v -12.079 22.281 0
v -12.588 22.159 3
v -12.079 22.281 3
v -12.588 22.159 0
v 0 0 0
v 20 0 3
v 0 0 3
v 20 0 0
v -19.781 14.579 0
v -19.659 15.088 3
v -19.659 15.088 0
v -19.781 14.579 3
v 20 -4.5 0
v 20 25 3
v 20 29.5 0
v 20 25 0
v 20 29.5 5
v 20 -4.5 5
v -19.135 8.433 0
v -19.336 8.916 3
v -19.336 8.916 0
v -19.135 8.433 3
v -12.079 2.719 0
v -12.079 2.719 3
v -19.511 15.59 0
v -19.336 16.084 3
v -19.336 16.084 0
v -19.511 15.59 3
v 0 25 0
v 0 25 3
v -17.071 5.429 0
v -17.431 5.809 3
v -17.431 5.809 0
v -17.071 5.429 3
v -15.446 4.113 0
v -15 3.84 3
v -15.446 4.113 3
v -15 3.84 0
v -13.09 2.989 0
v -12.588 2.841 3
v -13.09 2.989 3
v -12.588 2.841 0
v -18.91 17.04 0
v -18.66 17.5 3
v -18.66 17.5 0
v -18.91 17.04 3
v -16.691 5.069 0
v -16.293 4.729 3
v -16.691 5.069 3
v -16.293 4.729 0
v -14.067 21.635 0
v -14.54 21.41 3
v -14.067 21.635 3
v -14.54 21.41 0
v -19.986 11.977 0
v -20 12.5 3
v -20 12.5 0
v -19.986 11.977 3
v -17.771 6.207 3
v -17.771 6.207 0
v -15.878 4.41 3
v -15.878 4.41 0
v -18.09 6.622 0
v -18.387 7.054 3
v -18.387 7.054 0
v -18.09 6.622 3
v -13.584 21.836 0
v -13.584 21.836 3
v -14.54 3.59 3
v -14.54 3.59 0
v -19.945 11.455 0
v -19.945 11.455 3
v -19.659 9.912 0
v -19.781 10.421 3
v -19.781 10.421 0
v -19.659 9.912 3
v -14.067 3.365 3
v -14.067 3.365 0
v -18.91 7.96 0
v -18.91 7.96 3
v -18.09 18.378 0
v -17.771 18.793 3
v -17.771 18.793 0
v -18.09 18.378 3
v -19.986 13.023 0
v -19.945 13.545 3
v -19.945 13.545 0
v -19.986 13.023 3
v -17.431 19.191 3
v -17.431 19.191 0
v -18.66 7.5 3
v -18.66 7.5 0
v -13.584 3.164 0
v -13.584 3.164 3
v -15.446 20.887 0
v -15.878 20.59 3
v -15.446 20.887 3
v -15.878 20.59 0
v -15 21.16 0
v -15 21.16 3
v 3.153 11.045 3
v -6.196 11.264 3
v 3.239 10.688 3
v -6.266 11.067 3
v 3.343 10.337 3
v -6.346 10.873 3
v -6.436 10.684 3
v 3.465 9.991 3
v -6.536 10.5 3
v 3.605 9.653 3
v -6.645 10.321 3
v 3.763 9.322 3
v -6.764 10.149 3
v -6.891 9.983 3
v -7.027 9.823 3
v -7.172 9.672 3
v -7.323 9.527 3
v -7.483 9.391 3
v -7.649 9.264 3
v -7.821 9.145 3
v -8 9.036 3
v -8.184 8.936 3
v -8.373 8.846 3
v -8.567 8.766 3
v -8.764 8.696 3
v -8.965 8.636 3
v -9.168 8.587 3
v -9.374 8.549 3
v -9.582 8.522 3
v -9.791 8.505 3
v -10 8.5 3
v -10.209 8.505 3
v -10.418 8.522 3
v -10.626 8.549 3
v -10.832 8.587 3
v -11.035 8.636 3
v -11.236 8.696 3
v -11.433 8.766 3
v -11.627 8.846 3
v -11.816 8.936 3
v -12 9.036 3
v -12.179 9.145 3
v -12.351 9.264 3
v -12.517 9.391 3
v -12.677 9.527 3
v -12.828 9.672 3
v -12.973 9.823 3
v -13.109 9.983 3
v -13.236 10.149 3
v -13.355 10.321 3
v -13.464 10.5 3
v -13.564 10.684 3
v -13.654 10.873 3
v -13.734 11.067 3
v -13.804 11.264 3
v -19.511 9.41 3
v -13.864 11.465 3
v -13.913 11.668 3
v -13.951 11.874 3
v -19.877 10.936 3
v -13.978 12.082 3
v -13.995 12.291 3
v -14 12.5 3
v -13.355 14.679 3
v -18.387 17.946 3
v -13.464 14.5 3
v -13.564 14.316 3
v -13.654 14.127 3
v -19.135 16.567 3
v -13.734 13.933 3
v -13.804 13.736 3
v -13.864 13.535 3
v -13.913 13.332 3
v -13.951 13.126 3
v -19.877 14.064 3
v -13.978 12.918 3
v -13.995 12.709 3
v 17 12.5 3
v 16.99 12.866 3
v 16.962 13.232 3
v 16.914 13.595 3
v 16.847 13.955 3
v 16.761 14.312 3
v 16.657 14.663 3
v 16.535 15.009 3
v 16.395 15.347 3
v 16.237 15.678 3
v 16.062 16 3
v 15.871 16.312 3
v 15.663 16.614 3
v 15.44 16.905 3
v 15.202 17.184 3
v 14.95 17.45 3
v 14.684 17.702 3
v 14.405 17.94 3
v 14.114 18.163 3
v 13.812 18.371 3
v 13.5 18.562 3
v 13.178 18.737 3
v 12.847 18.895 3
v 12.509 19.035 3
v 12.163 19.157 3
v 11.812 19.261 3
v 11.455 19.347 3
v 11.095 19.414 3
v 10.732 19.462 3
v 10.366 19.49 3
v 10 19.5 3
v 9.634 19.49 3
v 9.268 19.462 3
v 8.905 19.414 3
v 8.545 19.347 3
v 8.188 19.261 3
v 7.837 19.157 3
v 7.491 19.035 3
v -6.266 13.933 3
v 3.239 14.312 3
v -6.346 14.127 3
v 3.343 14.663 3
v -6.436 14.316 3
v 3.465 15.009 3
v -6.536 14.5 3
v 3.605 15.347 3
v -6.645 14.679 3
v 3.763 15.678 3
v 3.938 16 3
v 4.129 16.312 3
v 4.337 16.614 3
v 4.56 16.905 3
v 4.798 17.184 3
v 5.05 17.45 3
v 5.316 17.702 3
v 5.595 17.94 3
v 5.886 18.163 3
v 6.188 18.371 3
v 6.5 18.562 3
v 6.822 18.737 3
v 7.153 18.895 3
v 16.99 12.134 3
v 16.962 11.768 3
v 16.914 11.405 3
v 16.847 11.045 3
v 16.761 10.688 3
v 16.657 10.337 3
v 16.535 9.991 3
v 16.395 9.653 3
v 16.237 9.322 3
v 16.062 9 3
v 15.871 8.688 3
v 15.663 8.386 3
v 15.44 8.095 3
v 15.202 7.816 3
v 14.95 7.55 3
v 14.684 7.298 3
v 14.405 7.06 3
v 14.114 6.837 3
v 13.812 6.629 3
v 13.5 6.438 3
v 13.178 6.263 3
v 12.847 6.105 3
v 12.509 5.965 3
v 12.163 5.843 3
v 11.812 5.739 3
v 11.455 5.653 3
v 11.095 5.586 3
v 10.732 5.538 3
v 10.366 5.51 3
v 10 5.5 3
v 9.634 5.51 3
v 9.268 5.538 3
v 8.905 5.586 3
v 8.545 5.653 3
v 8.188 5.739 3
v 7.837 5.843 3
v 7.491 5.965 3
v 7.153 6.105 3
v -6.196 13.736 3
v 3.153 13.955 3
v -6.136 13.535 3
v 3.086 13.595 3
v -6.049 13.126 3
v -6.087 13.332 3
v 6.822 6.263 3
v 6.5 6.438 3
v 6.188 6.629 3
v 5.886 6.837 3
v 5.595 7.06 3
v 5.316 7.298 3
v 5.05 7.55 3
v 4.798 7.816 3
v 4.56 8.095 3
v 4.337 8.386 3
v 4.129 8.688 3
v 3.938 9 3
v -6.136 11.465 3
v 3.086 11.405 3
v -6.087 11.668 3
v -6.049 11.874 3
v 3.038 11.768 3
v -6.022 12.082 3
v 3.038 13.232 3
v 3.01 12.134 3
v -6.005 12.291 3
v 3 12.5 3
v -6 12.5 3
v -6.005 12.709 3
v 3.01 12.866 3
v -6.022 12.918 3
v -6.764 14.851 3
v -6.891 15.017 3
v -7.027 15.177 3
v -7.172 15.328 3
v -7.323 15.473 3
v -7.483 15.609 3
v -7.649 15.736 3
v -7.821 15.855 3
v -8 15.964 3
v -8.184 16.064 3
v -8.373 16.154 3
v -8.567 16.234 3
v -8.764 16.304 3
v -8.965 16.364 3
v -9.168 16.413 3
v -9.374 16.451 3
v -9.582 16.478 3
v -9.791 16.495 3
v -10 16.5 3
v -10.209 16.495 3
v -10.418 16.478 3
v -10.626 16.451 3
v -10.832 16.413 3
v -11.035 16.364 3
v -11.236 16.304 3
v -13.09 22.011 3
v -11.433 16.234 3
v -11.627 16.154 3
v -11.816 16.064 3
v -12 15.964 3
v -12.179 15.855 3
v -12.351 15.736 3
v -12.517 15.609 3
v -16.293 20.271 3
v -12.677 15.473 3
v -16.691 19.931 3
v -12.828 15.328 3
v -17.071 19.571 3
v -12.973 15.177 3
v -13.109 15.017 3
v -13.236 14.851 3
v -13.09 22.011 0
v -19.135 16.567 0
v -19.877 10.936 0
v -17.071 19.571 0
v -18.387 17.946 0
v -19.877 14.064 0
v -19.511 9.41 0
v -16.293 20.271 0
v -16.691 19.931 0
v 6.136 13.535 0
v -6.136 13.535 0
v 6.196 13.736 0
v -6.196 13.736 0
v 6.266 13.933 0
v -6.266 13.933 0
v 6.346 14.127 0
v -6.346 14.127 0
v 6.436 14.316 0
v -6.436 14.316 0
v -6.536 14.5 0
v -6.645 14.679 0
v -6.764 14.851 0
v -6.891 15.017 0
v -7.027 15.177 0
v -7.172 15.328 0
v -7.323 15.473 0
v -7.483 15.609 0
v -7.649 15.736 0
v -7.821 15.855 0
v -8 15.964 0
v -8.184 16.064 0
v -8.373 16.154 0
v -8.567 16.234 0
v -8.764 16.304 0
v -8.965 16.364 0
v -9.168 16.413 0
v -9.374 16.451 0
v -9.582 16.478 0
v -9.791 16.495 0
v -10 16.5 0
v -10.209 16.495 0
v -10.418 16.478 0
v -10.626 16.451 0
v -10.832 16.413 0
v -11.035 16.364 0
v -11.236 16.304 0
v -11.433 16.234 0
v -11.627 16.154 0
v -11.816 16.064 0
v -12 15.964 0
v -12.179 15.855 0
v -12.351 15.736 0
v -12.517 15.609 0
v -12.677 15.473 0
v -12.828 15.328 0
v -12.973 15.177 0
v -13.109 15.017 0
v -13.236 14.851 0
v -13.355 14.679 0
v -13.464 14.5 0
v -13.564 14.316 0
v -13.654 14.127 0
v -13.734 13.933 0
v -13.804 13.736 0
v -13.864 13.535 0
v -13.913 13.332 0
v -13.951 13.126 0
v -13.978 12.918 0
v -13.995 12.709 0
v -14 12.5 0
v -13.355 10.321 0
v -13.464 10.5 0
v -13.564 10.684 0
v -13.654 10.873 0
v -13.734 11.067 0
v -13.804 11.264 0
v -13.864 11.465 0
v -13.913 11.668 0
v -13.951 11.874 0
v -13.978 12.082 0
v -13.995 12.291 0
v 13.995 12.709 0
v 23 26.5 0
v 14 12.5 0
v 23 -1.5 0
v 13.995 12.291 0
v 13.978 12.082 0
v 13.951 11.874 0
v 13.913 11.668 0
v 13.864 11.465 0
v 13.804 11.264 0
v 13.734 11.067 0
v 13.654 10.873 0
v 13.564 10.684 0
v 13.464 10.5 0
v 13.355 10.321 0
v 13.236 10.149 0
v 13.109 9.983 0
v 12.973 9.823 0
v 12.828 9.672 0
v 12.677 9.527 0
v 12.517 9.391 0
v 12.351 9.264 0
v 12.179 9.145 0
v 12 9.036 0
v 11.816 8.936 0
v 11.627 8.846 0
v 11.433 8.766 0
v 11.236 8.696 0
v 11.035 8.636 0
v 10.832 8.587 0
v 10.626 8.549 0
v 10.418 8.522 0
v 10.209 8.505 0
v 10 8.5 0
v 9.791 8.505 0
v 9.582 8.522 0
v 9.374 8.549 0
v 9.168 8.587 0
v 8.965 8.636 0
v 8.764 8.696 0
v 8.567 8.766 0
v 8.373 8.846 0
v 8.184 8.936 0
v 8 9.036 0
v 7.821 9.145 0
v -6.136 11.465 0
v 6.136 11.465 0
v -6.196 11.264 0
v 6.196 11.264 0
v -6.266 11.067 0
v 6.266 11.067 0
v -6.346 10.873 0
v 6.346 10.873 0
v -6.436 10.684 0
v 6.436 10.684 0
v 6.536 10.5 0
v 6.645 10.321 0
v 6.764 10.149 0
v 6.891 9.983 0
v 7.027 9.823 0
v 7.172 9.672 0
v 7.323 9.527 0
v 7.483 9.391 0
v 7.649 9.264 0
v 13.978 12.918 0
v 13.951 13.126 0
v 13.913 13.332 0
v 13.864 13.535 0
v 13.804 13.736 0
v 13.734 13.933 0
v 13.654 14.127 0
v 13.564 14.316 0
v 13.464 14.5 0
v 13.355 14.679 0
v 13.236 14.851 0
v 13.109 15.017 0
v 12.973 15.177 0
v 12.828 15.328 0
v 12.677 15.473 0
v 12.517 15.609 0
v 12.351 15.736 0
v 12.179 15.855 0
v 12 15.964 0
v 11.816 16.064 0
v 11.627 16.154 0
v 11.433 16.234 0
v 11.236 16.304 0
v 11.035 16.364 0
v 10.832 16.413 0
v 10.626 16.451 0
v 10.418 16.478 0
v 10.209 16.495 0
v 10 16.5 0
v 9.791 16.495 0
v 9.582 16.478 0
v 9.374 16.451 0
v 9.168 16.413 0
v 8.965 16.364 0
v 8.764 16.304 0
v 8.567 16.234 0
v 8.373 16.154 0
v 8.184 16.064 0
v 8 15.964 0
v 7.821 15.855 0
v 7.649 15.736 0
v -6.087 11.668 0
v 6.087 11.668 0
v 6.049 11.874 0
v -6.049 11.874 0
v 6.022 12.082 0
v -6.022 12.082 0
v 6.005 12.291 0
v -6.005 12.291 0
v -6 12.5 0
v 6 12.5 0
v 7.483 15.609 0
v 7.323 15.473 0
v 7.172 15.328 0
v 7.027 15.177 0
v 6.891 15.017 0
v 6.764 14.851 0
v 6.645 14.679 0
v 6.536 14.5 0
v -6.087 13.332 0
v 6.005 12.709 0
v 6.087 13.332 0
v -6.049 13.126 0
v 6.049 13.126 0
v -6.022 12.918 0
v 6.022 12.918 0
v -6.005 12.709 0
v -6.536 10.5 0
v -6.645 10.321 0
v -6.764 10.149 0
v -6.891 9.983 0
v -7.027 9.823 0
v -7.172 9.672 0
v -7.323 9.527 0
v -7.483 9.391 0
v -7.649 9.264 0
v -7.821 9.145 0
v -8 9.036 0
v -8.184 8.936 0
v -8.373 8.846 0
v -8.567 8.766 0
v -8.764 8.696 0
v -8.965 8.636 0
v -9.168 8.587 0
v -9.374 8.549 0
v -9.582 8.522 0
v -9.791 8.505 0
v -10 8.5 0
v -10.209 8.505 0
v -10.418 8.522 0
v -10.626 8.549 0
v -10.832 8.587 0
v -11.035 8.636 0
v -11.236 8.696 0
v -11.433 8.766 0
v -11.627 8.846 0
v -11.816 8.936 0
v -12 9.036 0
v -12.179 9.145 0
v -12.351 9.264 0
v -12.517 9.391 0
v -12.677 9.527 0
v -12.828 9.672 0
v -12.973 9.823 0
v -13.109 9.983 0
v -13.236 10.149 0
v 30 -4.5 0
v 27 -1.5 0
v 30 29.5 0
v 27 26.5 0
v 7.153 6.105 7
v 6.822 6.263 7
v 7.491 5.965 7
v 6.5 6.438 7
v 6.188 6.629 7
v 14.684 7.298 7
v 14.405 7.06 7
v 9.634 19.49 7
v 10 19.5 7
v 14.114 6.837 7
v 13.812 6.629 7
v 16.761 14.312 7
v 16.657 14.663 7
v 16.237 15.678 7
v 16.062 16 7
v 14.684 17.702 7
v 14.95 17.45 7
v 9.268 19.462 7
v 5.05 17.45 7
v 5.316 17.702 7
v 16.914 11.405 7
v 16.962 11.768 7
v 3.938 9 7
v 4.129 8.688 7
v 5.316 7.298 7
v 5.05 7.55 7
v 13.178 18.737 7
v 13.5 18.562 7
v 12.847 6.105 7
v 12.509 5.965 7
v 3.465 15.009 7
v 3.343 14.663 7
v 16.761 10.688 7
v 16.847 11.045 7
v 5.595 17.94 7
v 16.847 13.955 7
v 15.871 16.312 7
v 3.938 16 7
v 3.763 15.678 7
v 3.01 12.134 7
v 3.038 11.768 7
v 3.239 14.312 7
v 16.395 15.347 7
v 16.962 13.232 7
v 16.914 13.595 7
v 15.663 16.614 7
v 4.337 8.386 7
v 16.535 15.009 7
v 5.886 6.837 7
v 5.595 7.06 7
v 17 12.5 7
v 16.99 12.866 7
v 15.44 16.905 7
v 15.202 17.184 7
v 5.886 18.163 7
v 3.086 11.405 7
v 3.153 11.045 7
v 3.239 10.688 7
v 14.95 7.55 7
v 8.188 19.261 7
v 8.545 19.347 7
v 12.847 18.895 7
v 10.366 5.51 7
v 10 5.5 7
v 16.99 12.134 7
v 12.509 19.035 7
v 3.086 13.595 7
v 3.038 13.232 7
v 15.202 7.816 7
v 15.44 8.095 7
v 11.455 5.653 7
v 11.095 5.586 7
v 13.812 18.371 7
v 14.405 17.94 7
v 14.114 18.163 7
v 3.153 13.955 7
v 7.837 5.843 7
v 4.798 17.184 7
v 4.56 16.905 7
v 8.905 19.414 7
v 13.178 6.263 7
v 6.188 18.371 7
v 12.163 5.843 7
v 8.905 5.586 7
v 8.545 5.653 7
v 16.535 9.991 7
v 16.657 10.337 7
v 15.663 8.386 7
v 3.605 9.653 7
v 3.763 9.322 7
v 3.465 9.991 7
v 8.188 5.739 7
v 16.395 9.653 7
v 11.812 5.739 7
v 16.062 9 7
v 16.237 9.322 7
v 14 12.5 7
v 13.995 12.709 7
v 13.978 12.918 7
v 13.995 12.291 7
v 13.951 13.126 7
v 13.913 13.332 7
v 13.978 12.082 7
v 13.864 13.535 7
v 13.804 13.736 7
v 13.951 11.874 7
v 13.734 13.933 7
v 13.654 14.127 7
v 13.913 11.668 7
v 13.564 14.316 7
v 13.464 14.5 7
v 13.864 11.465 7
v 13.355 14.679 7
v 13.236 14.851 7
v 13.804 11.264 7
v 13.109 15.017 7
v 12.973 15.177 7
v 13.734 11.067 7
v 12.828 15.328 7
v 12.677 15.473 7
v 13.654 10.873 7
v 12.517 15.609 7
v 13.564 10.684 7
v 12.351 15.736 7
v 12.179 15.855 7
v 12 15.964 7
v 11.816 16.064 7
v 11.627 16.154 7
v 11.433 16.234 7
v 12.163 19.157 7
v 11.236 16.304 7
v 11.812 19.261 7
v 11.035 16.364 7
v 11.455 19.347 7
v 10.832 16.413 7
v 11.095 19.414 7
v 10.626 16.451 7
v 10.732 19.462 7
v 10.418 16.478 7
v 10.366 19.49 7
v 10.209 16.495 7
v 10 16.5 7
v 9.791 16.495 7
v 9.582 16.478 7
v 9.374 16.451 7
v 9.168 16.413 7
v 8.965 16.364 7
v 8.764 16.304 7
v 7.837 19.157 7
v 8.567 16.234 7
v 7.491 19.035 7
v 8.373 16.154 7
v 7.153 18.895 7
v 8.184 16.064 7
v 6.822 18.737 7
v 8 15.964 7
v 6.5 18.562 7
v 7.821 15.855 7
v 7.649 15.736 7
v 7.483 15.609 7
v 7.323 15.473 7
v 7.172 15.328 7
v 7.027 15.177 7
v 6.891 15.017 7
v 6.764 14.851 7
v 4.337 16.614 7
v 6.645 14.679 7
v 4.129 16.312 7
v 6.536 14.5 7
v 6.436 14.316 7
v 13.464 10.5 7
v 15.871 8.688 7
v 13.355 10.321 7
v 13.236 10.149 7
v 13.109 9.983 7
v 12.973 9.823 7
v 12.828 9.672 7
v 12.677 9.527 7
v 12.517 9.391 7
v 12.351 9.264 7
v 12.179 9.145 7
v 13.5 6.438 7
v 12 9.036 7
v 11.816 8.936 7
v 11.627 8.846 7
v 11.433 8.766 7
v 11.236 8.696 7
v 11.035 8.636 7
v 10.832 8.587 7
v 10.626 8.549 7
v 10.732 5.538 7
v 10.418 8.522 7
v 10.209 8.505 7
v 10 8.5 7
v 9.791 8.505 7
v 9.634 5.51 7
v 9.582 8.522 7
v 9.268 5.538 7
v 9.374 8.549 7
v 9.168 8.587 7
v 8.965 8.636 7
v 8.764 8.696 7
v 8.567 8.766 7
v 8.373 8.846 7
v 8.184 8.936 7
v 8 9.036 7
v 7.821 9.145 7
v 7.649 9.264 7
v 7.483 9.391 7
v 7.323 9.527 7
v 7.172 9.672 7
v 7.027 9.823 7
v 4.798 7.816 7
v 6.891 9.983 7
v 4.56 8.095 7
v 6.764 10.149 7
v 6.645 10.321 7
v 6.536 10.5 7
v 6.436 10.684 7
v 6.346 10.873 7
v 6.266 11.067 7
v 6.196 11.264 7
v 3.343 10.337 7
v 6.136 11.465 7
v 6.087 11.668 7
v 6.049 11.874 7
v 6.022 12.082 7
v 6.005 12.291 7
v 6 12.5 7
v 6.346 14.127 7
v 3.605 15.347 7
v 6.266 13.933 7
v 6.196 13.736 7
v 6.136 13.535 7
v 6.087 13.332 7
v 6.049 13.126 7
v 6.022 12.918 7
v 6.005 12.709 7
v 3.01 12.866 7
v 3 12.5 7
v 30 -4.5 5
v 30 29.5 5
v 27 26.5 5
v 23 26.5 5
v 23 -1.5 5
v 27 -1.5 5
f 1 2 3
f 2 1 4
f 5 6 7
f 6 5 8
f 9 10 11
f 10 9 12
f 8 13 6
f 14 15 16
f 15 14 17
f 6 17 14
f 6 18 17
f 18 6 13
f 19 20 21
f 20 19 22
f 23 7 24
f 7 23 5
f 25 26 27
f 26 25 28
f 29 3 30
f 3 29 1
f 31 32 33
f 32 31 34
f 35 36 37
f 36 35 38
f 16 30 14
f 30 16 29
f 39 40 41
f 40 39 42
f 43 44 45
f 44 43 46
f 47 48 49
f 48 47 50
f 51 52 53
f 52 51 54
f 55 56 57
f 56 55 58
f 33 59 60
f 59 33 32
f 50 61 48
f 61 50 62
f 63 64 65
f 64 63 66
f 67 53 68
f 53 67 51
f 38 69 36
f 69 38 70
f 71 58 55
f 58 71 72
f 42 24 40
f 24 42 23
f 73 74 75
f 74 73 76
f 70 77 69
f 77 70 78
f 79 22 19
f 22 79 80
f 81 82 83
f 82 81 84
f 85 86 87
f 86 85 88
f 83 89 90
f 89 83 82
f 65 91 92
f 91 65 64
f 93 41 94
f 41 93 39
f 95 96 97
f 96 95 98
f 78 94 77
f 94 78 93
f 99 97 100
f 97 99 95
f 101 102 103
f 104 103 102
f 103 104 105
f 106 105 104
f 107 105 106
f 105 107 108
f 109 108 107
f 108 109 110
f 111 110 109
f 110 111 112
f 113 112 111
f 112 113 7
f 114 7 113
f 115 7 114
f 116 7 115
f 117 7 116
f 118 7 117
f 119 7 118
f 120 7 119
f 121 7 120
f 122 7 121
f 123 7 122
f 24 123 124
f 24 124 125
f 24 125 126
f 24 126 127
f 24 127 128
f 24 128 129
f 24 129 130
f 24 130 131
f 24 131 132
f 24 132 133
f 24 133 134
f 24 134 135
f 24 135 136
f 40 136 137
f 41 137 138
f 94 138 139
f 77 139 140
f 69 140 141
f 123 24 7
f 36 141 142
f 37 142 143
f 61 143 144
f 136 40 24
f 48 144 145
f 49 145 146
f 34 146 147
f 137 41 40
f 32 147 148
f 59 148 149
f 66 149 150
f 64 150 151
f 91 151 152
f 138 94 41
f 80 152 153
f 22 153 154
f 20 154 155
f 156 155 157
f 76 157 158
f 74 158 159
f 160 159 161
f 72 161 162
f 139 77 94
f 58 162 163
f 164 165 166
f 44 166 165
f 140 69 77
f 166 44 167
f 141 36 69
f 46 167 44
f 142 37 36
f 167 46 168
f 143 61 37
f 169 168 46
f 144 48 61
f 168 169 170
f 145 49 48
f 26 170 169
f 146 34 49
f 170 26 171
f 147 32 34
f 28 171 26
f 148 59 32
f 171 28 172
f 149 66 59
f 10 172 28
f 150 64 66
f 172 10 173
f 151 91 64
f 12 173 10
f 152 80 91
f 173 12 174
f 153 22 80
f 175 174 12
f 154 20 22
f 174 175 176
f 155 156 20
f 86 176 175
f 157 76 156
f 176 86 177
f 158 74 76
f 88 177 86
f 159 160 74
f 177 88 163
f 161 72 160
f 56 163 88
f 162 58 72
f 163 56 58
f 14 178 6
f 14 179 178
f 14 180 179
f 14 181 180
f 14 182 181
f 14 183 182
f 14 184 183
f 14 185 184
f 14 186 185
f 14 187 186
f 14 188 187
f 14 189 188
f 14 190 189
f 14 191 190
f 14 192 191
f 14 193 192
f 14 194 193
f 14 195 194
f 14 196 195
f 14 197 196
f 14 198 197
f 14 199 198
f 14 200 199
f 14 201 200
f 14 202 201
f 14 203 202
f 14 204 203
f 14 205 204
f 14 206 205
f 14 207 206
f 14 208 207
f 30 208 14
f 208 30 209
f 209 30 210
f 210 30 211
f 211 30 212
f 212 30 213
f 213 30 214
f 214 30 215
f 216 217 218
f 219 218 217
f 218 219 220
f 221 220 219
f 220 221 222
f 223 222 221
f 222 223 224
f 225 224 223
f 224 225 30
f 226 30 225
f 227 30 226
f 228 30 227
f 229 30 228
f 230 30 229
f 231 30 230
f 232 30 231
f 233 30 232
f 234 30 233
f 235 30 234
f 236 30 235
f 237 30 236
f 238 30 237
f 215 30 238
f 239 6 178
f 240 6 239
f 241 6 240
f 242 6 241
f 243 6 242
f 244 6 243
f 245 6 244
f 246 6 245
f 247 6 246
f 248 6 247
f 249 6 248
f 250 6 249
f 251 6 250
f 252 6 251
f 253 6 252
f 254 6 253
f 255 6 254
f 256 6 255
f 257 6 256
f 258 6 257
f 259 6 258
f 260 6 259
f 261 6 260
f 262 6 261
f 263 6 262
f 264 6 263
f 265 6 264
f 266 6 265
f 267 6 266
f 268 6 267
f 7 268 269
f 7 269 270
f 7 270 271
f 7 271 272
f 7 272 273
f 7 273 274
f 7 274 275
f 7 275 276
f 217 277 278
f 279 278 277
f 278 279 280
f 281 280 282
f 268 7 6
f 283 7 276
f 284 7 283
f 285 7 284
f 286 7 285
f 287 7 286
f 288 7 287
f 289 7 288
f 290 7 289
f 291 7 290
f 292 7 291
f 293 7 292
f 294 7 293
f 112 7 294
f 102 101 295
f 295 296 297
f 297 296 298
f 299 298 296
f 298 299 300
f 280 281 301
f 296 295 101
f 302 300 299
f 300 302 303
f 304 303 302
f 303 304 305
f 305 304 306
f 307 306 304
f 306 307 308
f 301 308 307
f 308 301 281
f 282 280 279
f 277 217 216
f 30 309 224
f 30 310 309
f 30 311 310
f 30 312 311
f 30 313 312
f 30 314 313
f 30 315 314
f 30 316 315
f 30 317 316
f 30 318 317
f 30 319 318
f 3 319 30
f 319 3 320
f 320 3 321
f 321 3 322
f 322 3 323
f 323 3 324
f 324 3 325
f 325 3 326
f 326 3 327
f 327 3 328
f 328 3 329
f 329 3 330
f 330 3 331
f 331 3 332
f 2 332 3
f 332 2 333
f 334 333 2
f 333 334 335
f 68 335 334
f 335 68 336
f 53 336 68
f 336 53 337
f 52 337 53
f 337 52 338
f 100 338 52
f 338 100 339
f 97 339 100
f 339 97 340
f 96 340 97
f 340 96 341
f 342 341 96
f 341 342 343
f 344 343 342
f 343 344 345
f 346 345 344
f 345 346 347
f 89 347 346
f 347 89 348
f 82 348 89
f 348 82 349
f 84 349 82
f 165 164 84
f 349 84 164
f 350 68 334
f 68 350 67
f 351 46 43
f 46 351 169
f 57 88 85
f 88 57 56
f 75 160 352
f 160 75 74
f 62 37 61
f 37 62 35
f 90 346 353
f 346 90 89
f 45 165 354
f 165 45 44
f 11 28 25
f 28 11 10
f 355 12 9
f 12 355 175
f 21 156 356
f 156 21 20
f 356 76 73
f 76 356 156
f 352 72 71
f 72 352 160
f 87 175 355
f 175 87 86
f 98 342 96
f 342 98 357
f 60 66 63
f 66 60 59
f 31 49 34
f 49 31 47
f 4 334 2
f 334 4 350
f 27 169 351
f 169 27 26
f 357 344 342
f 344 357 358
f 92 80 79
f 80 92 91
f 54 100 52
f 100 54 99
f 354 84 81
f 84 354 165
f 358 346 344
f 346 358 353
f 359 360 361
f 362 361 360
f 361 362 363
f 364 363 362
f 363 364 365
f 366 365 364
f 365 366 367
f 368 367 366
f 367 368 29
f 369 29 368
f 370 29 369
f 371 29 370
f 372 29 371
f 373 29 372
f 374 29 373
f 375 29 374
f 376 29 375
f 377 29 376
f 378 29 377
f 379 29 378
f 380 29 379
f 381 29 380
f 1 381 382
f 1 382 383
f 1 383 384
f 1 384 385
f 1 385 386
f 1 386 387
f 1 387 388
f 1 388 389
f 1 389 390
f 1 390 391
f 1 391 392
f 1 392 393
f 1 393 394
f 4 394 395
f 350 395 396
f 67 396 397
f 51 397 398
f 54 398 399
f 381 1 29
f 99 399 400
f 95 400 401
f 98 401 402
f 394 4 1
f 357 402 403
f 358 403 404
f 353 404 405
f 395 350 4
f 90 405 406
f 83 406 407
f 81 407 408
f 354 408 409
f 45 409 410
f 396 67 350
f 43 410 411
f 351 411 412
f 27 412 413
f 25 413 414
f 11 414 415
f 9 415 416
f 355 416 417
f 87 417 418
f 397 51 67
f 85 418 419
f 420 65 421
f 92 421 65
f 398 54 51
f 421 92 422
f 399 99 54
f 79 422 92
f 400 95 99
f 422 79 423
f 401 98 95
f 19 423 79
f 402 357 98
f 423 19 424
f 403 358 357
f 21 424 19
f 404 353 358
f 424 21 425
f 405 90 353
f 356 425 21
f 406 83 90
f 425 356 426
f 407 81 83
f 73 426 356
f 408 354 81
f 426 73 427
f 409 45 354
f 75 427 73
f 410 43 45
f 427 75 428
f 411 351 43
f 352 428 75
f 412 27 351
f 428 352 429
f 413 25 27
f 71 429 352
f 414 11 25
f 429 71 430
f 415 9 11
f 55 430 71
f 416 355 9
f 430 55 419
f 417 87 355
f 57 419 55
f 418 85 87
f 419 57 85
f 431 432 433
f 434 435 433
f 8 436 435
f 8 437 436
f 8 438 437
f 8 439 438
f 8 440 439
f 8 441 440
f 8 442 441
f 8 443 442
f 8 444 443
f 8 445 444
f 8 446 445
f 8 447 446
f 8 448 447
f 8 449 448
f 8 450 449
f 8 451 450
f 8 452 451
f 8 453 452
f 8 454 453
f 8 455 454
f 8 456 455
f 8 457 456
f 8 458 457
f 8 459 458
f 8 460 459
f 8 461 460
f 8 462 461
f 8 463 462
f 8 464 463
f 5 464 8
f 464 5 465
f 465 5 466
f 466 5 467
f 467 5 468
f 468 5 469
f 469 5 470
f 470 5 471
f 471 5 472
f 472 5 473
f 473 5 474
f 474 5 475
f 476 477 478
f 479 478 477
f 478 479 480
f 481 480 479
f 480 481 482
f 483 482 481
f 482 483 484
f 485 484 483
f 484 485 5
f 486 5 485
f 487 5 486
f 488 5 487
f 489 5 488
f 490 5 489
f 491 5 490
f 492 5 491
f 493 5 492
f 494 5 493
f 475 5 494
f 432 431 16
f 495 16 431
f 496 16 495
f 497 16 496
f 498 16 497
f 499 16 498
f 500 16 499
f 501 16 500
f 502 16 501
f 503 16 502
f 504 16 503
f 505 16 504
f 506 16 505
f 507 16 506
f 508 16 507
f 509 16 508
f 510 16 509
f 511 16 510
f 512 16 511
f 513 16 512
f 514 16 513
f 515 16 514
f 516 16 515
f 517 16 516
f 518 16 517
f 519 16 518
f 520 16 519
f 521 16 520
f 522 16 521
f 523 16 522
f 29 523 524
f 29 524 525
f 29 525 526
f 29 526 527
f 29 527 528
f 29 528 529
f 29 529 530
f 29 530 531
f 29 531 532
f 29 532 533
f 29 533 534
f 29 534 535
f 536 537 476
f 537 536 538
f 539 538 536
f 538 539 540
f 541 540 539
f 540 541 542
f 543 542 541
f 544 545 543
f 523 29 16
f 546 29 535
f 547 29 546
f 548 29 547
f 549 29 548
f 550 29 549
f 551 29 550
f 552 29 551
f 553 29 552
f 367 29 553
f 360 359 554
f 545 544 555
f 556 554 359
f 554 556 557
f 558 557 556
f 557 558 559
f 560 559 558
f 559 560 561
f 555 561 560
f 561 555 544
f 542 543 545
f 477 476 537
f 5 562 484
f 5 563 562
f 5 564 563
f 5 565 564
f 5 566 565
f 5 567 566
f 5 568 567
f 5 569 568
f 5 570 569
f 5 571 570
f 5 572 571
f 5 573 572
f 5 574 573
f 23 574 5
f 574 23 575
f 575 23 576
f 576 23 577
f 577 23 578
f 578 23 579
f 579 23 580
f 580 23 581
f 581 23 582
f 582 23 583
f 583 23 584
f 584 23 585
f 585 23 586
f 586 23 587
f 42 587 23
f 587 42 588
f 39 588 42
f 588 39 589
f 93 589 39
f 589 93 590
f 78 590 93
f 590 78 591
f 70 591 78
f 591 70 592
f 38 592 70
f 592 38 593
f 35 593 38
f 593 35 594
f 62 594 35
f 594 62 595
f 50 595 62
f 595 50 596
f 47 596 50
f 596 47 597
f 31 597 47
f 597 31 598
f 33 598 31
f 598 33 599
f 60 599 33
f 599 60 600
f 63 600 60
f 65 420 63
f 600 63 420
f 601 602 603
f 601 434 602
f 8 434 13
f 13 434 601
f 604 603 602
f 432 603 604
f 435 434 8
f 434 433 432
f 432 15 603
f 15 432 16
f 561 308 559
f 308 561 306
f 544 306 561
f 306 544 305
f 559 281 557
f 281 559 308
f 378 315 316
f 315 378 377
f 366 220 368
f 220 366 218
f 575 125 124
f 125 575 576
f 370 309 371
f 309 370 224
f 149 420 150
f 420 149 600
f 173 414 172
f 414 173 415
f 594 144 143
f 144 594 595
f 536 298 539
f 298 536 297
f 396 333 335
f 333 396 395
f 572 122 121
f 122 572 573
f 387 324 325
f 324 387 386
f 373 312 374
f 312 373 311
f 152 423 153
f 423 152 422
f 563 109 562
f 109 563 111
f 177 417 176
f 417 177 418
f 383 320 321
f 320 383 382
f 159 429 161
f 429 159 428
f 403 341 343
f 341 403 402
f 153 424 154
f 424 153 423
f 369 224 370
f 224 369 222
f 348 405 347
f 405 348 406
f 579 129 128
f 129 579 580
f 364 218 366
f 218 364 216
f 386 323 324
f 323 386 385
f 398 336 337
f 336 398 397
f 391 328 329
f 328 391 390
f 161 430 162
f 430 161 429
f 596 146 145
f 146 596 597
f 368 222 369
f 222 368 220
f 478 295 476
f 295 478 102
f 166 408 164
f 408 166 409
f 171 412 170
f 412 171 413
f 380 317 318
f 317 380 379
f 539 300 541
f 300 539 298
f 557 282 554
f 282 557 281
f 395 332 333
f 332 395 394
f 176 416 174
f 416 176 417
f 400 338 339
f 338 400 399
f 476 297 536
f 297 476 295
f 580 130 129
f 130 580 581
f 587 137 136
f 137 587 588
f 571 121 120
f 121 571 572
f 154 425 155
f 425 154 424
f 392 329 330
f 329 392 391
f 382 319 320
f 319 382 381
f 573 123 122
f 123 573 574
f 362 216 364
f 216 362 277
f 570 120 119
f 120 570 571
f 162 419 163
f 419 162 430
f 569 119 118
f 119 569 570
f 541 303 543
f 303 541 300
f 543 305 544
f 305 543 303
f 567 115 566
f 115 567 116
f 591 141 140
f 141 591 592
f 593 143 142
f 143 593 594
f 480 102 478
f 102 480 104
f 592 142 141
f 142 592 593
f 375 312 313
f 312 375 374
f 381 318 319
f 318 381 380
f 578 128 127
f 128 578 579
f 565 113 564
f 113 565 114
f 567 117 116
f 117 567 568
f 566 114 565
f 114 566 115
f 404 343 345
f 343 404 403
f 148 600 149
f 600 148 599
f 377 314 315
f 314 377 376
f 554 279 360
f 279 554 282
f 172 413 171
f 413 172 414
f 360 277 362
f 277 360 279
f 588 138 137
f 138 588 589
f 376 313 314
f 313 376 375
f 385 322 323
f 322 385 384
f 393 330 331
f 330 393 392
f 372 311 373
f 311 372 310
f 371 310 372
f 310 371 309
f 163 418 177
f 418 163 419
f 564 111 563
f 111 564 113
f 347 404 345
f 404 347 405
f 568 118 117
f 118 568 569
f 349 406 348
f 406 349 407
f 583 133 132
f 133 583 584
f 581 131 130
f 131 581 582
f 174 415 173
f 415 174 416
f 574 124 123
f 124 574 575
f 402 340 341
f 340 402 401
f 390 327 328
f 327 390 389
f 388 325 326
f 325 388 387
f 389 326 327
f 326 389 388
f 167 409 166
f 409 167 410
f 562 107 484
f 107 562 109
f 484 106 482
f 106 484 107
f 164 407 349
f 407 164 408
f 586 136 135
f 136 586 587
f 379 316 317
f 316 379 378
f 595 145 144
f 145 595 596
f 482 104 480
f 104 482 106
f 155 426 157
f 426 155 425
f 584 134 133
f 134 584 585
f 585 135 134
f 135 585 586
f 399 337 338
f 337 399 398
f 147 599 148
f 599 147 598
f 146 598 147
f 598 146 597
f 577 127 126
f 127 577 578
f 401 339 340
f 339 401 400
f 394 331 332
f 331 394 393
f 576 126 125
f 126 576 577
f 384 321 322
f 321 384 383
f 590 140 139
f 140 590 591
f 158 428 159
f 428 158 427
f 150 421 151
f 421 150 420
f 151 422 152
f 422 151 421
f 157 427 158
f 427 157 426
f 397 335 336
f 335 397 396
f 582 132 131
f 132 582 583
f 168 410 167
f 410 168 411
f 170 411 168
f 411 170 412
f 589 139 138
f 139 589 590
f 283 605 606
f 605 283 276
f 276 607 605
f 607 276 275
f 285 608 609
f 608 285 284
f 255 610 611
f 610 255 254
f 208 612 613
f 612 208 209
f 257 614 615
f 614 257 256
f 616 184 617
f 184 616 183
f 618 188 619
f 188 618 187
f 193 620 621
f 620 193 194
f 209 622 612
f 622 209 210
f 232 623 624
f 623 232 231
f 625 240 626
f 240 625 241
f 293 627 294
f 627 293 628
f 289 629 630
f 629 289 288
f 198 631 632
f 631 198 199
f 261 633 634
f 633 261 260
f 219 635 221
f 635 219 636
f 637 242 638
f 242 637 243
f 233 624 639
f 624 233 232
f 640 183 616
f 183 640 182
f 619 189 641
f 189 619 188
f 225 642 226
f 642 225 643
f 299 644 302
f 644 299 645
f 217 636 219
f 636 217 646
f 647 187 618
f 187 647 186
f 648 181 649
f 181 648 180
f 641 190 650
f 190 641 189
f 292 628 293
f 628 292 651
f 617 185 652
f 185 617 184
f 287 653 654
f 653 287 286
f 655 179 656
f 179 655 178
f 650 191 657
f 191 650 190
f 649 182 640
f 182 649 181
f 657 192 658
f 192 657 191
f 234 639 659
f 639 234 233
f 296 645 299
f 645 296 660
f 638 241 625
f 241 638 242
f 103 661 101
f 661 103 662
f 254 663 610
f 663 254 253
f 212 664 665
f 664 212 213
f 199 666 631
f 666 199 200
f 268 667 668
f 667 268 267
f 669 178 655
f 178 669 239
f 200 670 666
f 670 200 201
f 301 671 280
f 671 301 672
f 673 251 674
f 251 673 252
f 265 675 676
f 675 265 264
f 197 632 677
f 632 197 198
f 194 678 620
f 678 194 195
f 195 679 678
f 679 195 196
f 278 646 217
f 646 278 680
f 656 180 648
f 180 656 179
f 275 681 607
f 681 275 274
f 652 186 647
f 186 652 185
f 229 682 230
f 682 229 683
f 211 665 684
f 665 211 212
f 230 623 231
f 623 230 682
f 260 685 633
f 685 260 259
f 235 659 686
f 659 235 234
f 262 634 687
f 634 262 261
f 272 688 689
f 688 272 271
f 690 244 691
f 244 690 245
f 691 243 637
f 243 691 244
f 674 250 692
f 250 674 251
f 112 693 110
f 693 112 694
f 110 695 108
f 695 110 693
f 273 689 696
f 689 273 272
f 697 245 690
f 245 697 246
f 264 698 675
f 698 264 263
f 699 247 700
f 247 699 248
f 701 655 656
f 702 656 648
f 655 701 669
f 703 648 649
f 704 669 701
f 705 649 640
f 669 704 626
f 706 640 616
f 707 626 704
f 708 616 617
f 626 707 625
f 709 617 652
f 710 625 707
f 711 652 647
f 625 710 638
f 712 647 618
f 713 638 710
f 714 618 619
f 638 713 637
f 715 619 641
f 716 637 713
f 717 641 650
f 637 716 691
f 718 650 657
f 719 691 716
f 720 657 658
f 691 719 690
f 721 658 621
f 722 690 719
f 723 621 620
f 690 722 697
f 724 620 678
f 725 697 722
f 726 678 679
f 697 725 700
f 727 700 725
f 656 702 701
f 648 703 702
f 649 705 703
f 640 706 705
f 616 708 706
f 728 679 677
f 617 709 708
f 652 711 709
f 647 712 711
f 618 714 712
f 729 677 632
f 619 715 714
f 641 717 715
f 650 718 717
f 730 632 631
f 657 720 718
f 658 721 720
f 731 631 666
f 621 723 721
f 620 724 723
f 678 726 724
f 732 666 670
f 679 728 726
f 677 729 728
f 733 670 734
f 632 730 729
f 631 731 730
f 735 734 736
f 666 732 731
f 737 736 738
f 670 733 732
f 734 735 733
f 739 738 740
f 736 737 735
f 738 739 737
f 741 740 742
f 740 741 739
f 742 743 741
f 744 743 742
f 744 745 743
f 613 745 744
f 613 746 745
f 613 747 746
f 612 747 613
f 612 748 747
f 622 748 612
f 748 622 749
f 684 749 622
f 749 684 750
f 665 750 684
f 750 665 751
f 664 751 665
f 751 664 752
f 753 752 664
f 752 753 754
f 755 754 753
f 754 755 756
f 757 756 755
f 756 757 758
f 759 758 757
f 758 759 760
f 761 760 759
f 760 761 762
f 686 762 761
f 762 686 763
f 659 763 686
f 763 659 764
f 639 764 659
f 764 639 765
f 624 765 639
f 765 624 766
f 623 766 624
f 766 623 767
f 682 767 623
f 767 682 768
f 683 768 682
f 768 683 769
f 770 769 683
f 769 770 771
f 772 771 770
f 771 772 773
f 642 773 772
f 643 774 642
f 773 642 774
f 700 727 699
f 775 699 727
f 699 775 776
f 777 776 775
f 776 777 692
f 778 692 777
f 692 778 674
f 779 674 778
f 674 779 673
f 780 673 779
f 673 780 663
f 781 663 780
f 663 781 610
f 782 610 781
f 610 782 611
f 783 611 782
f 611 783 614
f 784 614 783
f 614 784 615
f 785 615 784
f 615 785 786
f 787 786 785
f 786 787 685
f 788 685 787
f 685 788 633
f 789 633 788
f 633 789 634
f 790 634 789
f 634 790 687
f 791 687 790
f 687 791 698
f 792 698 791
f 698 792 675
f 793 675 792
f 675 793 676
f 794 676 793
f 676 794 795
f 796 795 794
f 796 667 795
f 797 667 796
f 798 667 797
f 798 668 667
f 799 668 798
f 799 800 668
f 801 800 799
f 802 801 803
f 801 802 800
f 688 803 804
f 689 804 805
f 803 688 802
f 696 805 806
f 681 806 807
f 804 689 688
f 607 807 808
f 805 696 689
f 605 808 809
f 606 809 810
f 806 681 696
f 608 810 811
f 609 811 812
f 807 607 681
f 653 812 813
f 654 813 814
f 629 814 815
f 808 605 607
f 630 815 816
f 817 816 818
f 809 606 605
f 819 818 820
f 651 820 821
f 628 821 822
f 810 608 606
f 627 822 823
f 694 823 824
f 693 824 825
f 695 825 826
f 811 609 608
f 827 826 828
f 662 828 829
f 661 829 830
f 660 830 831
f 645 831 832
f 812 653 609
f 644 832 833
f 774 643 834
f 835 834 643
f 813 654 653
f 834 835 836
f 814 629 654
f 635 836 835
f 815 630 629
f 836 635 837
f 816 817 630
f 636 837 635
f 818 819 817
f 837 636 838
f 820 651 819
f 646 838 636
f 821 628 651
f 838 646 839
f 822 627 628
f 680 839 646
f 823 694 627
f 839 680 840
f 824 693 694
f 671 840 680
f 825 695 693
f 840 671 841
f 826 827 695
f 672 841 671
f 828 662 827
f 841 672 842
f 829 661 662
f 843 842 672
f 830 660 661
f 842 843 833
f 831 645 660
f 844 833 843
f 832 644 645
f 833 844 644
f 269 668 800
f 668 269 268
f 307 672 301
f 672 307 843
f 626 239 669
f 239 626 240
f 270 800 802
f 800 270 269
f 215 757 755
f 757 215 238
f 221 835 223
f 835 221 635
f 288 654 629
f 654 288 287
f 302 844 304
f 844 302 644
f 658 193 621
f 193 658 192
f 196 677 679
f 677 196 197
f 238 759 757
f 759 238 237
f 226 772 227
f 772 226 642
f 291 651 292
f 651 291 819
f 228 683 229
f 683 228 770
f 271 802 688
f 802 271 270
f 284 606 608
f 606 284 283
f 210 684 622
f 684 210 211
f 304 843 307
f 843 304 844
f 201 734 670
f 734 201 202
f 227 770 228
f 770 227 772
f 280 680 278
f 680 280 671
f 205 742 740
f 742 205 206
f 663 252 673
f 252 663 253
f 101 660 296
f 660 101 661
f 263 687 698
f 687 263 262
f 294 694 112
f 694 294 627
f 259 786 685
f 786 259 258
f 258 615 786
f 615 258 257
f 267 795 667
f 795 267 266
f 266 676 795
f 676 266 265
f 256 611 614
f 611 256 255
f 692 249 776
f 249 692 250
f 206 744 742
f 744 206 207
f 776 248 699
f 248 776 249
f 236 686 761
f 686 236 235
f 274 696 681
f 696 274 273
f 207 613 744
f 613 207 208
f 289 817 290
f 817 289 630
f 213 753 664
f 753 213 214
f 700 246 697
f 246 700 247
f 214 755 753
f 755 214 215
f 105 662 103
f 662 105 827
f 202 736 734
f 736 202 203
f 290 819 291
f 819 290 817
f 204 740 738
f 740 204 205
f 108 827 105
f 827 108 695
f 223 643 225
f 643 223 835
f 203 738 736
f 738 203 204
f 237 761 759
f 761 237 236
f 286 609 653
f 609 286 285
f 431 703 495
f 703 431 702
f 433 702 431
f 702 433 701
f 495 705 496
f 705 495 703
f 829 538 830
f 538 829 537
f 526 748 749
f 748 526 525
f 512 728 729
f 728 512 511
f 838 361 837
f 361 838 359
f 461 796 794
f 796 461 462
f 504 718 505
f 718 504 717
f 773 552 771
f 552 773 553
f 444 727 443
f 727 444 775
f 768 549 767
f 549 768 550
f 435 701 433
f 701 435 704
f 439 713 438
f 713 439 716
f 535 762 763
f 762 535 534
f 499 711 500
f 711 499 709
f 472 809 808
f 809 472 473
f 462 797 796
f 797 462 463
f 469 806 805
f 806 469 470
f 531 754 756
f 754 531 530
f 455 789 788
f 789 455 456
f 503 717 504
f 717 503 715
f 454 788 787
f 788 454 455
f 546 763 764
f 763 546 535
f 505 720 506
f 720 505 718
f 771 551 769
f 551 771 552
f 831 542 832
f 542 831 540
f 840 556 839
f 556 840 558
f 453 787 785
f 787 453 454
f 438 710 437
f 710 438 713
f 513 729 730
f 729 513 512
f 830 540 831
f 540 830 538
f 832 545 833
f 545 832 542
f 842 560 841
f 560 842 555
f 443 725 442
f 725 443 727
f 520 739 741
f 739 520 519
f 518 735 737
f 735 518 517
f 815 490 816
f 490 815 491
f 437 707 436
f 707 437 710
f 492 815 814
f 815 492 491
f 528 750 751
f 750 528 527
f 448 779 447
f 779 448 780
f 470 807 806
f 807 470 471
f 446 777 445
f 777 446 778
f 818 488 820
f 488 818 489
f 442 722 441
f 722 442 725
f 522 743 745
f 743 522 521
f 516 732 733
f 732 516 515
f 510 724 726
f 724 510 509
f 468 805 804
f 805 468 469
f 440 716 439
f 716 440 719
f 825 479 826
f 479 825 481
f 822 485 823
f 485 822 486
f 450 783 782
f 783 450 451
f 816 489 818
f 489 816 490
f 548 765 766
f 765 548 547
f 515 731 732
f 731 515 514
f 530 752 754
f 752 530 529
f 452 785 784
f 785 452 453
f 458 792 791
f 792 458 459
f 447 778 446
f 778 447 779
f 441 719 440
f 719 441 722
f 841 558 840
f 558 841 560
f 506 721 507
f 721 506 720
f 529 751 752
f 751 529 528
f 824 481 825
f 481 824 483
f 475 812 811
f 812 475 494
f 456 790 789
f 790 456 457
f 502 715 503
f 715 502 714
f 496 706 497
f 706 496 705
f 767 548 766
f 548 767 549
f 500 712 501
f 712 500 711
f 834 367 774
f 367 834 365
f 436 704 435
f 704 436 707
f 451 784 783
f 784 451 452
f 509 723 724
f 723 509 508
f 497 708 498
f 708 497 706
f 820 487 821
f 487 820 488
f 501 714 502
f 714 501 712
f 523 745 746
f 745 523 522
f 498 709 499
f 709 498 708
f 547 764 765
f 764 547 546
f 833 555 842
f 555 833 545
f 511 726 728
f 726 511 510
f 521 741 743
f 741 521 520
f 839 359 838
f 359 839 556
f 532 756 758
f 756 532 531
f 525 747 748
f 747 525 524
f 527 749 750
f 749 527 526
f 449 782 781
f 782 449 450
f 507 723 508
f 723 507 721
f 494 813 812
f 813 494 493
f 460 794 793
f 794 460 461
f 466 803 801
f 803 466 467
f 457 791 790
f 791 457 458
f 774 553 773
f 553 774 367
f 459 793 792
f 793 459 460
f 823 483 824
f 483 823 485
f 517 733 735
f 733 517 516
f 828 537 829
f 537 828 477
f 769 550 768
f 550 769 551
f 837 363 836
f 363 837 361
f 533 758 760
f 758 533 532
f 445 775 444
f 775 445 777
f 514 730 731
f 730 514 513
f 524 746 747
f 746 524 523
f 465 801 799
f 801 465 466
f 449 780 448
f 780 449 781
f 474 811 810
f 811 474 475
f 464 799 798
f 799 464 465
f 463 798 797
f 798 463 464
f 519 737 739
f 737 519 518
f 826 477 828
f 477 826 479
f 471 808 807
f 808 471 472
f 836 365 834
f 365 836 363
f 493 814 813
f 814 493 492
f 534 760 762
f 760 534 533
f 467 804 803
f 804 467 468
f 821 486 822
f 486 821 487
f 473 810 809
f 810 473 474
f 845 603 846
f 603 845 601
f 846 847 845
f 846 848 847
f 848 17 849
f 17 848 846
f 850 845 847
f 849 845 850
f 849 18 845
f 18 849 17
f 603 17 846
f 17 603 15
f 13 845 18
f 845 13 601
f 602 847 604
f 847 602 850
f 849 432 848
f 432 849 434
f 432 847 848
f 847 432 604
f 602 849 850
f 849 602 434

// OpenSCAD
$fn=120;
difference(){
union(){
difference(){
hull (){cube( [20,25,3]) ;
 
        translate([-10,12.5,0]) cylinder(3,10,10);    
       };
            translate([-10,12.5,-0.1]) cylinder(3.2,4,4);
            };
    translate([10,12.5,0]) cylinder (7,7,7);
                 
              
                
          };
        translate([10,12.5,-0.1]) cylinder (7.2,4,4);
      };
   difference(){  translate([20,-4.5,0]) cube([10,34,5]);
      translate([23,-1.5,-0.5]) cube([4,28,6]);
   };
